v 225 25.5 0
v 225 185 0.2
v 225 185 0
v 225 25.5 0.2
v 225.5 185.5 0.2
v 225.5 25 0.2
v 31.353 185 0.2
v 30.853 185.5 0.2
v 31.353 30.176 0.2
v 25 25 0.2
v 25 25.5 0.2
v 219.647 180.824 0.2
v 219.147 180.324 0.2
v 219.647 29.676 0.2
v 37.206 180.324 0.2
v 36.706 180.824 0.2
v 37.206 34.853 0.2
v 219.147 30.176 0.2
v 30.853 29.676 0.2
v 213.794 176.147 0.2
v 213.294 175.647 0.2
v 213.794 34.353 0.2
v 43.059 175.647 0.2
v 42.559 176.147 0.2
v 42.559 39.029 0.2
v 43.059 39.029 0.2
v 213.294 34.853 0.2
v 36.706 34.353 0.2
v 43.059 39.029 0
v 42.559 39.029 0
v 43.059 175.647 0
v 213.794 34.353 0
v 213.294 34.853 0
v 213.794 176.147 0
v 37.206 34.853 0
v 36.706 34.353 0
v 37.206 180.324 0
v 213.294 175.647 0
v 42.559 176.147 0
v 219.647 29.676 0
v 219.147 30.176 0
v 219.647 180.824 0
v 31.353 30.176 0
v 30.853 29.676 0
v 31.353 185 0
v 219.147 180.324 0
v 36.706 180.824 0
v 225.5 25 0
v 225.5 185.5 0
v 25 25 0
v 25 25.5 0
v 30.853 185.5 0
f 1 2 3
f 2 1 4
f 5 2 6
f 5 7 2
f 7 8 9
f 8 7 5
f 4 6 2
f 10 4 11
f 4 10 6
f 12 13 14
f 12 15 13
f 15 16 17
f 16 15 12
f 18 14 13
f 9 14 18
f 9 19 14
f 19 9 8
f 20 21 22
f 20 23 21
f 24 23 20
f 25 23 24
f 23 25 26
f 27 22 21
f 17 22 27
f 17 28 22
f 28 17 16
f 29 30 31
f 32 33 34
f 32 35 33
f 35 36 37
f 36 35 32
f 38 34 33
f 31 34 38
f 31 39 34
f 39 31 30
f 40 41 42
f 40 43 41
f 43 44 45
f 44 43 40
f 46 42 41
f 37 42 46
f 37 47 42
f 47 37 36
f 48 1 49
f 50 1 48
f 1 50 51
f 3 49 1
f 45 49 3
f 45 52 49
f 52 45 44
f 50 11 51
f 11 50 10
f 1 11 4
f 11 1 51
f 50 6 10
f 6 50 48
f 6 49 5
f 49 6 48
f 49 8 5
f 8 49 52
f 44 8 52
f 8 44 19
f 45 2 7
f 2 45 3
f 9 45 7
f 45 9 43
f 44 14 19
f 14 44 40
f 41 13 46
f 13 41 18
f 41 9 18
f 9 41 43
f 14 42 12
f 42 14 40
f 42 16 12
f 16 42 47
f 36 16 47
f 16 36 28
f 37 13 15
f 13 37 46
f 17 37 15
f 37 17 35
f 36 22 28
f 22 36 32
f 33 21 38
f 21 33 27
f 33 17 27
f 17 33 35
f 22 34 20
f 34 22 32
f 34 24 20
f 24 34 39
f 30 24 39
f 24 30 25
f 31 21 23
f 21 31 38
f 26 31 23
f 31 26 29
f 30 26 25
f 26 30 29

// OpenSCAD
// The current extruder you want to work with from 1 to the number of extruders
CurrentExtruder = 1;
// How many extruders you have.
ExtruderCount = 4;
// ExtruderCount * SpiralMultiplier = total number of spirals.
SpiralMultiplier = 4;
// The X dimension of your bed
BedSizeX = 250;
// The Y dimension of your bed
BedSizeY = 210;
// How much space on the left and right side of the x axis to leave
MarginX = 25;
// How much space on the front and back of the y axis to leave
MarginY = 25;
// How wide to draw each track.  If this value is too small you will have problems slicing.  If you are using Slic3r make sure you select 'detect thin walls'.
TrackWidth = 0.5;
// How tall to make this print.  You probably only want 1 layer.
LayerHeight = .2;


// Use at your own risk!  This has not been extensively debugged and does NOT prevent you from using unreasonable values!
module MultiExtruderTestSpiral(
CurrentExtruder = 1, // The extruder track to render (1 to ExtruderCount).  You will need to run this command once per extruder
ExtruderCount = 4, // How many extruders you have total.
SpiralMultiplier = 4, // Spirals total = ExtruderCount + SpiralMultiplier.  This does NOT mean that each extruder will have exactly 4 spirals, but things work out better if we have a multiple of the extruder count.
BedSizeX = 250, // The X width of the bed
BedSizeY = 210, // The Y width of the bed
MarginX = 25,// The amount of margin to leave on the left and right of the X axis
MarginY = 25,// The amount of margin to leave on the front and back of the Y axis
TrackWidth = 0.5,
LayerHeight = .2,
OutputDebugMessages = false
)
{
    //Calculations
    _spirals = SpiralMultiplier * ExtruderCount;
    _printSizeX = BedSizeX - MarginX*2;
    _printSizeY = BedSizeY - MarginY*2;
    _trackSpacingX = ((_printSizeX-TrackWidth*2)/(_spirals+1));
    _trackSpacingY = ((_printSizeY-TrackWidth*2)/(_spirals+1));

    translate([MarginX,MarginY])    // Center the object in the bed
    union()
    {
        // Calculate the length of the entire spiral.
        _spiralLengthTotal = _spiralLength(_spirals, 1,_printSizeX, _printSizeY, _trackSpacingX,_trackSpacingY, TrackWidth);
        // Calculate how much track would be drawn if things are 100% fair
        _lengthToPrintPerFilament = _spiralLengthTotal/ExtruderCount;
        // Calculate the start and end position of the current extruder in an ideal world
        _endLength = _lengthToPrintPerFilament * CurrentExtruder;
        _startLength = _endLength - _lengthToPrintPerFilament;
        
        if(OutputDebugMessages)
        {
            // Show some critical variables to help with debugging
            echo(SpiralLength=_spiralLengthTotal
                ,SpiralLengthPerFilament=_lengthToPrintPerFilament
                ,StartLength =_startLength
                ,EndLength = _endLength
                ,Difference = _endLength-_startLength
                );
        }
        for(_currentSpiral = [0:_spirals])
        {

            // Find each track length for the current spiral
            // First track, in X direction from left to right
            _trackLength1 = _printSizeX-(_trackSpacingX*_currentSpiral);
            // Second track, in Y direction, from front to back
            _trackLength2 = _printSizeY-_trackSpacingY*(_currentSpiral)+TrackWidth;
            // Third track, in the X direction from right to left.
            _trackLength3 = _printSizeX-(_trackSpacingX*(_currentSpiral+.5));
            // Fourth track, in the Y direction, from back to front
            _trackLength4 = _printSizeY-_trackSpacingY*(_currentSpiral+.5);
            _lengthPrinted = _spiralLength(_currentSpiral, 1,_printSizeX, _printSizeY, _trackSpacingX,_trackSpacingY, TrackWidth);
            
            if(_lengthPrinted >= _startLength && _lengthPrinted < _endLength)
            {
                if(OutputDebugMessages)
                {
                    echo(Extruder=CurrentExtruder
                        ,LengthPrinted = _lengthPrinted
                        ,Distance = _trackLength1+_trackLength2+_trackLength3+_trackLength4
                        ,Track1Length=_trackLength1
                        ,Track2Length = _trackLength2
                        , Track3Length=_trackLength3
                        , Track4Length = _trackLength4);
                }
                // First track, in X direction from left to right
                translate([_trackSpacingX*_currentSpiral/2,_trackSpacingY*_currentSpiral/2])cube([_trackLength1,TrackWidth,LayerHeight]);
                // Second track, in Y direction, from front to back
                translate([_printSizeX-_trackSpacingX*(_currentSpiral)/2,_trackSpacingY*(_currentSpiral)/2])cube([TrackWidth,_trackLength2,LayerHeight]);
                // Third track, in the X direction from right to left.
                translate([_trackSpacingX*(_currentSpiral+1)/2,_printSizeY-_trackSpacingY*_currentSpiral/2])cube([_trackLength3,TrackWidth,LayerHeight]);
                // Fourth track, in the Y direction, from back to front
                translate([_trackSpacingX*(_currentSpiral+1)/2,_trackSpacingY*(_currentSpiral+1)/2])cube([TrackWidth,_trackLength4,LayerHeight]);
            }
        }
        
        
    }
}
// Calculate the length of a series of spirals, starting with SpiralNum and ending at EndSpiral
function _spiralLength(SpiralNum,EndSpiral, PrintSizeX , PrintSizeY, TrackSpackingX, TrackSpackingY, TrackWidth) = 
(
    SpiralNum < EndSpiral ? 0 
        : PrintSizeX-(TrackSpackingX*SpiralNum) +
          PrintSizeY-TrackSpackingY*(SpiralNum)+TrackWidth +
          PrintSizeY-TrackSpackingY*(SpiralNum+.5) +
          PrintSizeX-(TrackSpackingX*(SpiralNum+.5)) +
          _spiralLength(SpiralNum- 1, EndSpiral,PrintSizeX , PrintSizeY, TrackSpackingX, TrackSpackingY, TrackWidth)
);

// Sample using defaults (Prusa Mk2 with MMU) , one command per extruder.
/*
MultiExtruderTestSpiral(CurrentExtruder=1);
MultiExtruderTestSpiral(CurrentExtruder=2);
MultiExtruderTestSpiral(CurrentExtruder=3);
MultiExtruderTestSpiral(CurrentExtruder=4);
*/

// Sample dual extruder setup
/*
MultiExtruderTestSpiral(CurrentExtruder=1,ExtruderCount=2);
MultiExtruderTestSpiral(CurrentExtruder=2,ExtruderCount=2);
*/




MultiExtruderTestSpiral(
    CurrentExtruder = CurrentExtruder,
    ExtruderCount = ExtruderCount,
    SpiralMultiplier = SpiralMultiplier,
    BedSizeX = BedSizeX,
    BedSizeY = BedSizeY,
    MarginX = MarginX,
    MarginY = MarginY,
    TrackWidth = TrackWidth,
    LayerHeight = LayerHeight

);
